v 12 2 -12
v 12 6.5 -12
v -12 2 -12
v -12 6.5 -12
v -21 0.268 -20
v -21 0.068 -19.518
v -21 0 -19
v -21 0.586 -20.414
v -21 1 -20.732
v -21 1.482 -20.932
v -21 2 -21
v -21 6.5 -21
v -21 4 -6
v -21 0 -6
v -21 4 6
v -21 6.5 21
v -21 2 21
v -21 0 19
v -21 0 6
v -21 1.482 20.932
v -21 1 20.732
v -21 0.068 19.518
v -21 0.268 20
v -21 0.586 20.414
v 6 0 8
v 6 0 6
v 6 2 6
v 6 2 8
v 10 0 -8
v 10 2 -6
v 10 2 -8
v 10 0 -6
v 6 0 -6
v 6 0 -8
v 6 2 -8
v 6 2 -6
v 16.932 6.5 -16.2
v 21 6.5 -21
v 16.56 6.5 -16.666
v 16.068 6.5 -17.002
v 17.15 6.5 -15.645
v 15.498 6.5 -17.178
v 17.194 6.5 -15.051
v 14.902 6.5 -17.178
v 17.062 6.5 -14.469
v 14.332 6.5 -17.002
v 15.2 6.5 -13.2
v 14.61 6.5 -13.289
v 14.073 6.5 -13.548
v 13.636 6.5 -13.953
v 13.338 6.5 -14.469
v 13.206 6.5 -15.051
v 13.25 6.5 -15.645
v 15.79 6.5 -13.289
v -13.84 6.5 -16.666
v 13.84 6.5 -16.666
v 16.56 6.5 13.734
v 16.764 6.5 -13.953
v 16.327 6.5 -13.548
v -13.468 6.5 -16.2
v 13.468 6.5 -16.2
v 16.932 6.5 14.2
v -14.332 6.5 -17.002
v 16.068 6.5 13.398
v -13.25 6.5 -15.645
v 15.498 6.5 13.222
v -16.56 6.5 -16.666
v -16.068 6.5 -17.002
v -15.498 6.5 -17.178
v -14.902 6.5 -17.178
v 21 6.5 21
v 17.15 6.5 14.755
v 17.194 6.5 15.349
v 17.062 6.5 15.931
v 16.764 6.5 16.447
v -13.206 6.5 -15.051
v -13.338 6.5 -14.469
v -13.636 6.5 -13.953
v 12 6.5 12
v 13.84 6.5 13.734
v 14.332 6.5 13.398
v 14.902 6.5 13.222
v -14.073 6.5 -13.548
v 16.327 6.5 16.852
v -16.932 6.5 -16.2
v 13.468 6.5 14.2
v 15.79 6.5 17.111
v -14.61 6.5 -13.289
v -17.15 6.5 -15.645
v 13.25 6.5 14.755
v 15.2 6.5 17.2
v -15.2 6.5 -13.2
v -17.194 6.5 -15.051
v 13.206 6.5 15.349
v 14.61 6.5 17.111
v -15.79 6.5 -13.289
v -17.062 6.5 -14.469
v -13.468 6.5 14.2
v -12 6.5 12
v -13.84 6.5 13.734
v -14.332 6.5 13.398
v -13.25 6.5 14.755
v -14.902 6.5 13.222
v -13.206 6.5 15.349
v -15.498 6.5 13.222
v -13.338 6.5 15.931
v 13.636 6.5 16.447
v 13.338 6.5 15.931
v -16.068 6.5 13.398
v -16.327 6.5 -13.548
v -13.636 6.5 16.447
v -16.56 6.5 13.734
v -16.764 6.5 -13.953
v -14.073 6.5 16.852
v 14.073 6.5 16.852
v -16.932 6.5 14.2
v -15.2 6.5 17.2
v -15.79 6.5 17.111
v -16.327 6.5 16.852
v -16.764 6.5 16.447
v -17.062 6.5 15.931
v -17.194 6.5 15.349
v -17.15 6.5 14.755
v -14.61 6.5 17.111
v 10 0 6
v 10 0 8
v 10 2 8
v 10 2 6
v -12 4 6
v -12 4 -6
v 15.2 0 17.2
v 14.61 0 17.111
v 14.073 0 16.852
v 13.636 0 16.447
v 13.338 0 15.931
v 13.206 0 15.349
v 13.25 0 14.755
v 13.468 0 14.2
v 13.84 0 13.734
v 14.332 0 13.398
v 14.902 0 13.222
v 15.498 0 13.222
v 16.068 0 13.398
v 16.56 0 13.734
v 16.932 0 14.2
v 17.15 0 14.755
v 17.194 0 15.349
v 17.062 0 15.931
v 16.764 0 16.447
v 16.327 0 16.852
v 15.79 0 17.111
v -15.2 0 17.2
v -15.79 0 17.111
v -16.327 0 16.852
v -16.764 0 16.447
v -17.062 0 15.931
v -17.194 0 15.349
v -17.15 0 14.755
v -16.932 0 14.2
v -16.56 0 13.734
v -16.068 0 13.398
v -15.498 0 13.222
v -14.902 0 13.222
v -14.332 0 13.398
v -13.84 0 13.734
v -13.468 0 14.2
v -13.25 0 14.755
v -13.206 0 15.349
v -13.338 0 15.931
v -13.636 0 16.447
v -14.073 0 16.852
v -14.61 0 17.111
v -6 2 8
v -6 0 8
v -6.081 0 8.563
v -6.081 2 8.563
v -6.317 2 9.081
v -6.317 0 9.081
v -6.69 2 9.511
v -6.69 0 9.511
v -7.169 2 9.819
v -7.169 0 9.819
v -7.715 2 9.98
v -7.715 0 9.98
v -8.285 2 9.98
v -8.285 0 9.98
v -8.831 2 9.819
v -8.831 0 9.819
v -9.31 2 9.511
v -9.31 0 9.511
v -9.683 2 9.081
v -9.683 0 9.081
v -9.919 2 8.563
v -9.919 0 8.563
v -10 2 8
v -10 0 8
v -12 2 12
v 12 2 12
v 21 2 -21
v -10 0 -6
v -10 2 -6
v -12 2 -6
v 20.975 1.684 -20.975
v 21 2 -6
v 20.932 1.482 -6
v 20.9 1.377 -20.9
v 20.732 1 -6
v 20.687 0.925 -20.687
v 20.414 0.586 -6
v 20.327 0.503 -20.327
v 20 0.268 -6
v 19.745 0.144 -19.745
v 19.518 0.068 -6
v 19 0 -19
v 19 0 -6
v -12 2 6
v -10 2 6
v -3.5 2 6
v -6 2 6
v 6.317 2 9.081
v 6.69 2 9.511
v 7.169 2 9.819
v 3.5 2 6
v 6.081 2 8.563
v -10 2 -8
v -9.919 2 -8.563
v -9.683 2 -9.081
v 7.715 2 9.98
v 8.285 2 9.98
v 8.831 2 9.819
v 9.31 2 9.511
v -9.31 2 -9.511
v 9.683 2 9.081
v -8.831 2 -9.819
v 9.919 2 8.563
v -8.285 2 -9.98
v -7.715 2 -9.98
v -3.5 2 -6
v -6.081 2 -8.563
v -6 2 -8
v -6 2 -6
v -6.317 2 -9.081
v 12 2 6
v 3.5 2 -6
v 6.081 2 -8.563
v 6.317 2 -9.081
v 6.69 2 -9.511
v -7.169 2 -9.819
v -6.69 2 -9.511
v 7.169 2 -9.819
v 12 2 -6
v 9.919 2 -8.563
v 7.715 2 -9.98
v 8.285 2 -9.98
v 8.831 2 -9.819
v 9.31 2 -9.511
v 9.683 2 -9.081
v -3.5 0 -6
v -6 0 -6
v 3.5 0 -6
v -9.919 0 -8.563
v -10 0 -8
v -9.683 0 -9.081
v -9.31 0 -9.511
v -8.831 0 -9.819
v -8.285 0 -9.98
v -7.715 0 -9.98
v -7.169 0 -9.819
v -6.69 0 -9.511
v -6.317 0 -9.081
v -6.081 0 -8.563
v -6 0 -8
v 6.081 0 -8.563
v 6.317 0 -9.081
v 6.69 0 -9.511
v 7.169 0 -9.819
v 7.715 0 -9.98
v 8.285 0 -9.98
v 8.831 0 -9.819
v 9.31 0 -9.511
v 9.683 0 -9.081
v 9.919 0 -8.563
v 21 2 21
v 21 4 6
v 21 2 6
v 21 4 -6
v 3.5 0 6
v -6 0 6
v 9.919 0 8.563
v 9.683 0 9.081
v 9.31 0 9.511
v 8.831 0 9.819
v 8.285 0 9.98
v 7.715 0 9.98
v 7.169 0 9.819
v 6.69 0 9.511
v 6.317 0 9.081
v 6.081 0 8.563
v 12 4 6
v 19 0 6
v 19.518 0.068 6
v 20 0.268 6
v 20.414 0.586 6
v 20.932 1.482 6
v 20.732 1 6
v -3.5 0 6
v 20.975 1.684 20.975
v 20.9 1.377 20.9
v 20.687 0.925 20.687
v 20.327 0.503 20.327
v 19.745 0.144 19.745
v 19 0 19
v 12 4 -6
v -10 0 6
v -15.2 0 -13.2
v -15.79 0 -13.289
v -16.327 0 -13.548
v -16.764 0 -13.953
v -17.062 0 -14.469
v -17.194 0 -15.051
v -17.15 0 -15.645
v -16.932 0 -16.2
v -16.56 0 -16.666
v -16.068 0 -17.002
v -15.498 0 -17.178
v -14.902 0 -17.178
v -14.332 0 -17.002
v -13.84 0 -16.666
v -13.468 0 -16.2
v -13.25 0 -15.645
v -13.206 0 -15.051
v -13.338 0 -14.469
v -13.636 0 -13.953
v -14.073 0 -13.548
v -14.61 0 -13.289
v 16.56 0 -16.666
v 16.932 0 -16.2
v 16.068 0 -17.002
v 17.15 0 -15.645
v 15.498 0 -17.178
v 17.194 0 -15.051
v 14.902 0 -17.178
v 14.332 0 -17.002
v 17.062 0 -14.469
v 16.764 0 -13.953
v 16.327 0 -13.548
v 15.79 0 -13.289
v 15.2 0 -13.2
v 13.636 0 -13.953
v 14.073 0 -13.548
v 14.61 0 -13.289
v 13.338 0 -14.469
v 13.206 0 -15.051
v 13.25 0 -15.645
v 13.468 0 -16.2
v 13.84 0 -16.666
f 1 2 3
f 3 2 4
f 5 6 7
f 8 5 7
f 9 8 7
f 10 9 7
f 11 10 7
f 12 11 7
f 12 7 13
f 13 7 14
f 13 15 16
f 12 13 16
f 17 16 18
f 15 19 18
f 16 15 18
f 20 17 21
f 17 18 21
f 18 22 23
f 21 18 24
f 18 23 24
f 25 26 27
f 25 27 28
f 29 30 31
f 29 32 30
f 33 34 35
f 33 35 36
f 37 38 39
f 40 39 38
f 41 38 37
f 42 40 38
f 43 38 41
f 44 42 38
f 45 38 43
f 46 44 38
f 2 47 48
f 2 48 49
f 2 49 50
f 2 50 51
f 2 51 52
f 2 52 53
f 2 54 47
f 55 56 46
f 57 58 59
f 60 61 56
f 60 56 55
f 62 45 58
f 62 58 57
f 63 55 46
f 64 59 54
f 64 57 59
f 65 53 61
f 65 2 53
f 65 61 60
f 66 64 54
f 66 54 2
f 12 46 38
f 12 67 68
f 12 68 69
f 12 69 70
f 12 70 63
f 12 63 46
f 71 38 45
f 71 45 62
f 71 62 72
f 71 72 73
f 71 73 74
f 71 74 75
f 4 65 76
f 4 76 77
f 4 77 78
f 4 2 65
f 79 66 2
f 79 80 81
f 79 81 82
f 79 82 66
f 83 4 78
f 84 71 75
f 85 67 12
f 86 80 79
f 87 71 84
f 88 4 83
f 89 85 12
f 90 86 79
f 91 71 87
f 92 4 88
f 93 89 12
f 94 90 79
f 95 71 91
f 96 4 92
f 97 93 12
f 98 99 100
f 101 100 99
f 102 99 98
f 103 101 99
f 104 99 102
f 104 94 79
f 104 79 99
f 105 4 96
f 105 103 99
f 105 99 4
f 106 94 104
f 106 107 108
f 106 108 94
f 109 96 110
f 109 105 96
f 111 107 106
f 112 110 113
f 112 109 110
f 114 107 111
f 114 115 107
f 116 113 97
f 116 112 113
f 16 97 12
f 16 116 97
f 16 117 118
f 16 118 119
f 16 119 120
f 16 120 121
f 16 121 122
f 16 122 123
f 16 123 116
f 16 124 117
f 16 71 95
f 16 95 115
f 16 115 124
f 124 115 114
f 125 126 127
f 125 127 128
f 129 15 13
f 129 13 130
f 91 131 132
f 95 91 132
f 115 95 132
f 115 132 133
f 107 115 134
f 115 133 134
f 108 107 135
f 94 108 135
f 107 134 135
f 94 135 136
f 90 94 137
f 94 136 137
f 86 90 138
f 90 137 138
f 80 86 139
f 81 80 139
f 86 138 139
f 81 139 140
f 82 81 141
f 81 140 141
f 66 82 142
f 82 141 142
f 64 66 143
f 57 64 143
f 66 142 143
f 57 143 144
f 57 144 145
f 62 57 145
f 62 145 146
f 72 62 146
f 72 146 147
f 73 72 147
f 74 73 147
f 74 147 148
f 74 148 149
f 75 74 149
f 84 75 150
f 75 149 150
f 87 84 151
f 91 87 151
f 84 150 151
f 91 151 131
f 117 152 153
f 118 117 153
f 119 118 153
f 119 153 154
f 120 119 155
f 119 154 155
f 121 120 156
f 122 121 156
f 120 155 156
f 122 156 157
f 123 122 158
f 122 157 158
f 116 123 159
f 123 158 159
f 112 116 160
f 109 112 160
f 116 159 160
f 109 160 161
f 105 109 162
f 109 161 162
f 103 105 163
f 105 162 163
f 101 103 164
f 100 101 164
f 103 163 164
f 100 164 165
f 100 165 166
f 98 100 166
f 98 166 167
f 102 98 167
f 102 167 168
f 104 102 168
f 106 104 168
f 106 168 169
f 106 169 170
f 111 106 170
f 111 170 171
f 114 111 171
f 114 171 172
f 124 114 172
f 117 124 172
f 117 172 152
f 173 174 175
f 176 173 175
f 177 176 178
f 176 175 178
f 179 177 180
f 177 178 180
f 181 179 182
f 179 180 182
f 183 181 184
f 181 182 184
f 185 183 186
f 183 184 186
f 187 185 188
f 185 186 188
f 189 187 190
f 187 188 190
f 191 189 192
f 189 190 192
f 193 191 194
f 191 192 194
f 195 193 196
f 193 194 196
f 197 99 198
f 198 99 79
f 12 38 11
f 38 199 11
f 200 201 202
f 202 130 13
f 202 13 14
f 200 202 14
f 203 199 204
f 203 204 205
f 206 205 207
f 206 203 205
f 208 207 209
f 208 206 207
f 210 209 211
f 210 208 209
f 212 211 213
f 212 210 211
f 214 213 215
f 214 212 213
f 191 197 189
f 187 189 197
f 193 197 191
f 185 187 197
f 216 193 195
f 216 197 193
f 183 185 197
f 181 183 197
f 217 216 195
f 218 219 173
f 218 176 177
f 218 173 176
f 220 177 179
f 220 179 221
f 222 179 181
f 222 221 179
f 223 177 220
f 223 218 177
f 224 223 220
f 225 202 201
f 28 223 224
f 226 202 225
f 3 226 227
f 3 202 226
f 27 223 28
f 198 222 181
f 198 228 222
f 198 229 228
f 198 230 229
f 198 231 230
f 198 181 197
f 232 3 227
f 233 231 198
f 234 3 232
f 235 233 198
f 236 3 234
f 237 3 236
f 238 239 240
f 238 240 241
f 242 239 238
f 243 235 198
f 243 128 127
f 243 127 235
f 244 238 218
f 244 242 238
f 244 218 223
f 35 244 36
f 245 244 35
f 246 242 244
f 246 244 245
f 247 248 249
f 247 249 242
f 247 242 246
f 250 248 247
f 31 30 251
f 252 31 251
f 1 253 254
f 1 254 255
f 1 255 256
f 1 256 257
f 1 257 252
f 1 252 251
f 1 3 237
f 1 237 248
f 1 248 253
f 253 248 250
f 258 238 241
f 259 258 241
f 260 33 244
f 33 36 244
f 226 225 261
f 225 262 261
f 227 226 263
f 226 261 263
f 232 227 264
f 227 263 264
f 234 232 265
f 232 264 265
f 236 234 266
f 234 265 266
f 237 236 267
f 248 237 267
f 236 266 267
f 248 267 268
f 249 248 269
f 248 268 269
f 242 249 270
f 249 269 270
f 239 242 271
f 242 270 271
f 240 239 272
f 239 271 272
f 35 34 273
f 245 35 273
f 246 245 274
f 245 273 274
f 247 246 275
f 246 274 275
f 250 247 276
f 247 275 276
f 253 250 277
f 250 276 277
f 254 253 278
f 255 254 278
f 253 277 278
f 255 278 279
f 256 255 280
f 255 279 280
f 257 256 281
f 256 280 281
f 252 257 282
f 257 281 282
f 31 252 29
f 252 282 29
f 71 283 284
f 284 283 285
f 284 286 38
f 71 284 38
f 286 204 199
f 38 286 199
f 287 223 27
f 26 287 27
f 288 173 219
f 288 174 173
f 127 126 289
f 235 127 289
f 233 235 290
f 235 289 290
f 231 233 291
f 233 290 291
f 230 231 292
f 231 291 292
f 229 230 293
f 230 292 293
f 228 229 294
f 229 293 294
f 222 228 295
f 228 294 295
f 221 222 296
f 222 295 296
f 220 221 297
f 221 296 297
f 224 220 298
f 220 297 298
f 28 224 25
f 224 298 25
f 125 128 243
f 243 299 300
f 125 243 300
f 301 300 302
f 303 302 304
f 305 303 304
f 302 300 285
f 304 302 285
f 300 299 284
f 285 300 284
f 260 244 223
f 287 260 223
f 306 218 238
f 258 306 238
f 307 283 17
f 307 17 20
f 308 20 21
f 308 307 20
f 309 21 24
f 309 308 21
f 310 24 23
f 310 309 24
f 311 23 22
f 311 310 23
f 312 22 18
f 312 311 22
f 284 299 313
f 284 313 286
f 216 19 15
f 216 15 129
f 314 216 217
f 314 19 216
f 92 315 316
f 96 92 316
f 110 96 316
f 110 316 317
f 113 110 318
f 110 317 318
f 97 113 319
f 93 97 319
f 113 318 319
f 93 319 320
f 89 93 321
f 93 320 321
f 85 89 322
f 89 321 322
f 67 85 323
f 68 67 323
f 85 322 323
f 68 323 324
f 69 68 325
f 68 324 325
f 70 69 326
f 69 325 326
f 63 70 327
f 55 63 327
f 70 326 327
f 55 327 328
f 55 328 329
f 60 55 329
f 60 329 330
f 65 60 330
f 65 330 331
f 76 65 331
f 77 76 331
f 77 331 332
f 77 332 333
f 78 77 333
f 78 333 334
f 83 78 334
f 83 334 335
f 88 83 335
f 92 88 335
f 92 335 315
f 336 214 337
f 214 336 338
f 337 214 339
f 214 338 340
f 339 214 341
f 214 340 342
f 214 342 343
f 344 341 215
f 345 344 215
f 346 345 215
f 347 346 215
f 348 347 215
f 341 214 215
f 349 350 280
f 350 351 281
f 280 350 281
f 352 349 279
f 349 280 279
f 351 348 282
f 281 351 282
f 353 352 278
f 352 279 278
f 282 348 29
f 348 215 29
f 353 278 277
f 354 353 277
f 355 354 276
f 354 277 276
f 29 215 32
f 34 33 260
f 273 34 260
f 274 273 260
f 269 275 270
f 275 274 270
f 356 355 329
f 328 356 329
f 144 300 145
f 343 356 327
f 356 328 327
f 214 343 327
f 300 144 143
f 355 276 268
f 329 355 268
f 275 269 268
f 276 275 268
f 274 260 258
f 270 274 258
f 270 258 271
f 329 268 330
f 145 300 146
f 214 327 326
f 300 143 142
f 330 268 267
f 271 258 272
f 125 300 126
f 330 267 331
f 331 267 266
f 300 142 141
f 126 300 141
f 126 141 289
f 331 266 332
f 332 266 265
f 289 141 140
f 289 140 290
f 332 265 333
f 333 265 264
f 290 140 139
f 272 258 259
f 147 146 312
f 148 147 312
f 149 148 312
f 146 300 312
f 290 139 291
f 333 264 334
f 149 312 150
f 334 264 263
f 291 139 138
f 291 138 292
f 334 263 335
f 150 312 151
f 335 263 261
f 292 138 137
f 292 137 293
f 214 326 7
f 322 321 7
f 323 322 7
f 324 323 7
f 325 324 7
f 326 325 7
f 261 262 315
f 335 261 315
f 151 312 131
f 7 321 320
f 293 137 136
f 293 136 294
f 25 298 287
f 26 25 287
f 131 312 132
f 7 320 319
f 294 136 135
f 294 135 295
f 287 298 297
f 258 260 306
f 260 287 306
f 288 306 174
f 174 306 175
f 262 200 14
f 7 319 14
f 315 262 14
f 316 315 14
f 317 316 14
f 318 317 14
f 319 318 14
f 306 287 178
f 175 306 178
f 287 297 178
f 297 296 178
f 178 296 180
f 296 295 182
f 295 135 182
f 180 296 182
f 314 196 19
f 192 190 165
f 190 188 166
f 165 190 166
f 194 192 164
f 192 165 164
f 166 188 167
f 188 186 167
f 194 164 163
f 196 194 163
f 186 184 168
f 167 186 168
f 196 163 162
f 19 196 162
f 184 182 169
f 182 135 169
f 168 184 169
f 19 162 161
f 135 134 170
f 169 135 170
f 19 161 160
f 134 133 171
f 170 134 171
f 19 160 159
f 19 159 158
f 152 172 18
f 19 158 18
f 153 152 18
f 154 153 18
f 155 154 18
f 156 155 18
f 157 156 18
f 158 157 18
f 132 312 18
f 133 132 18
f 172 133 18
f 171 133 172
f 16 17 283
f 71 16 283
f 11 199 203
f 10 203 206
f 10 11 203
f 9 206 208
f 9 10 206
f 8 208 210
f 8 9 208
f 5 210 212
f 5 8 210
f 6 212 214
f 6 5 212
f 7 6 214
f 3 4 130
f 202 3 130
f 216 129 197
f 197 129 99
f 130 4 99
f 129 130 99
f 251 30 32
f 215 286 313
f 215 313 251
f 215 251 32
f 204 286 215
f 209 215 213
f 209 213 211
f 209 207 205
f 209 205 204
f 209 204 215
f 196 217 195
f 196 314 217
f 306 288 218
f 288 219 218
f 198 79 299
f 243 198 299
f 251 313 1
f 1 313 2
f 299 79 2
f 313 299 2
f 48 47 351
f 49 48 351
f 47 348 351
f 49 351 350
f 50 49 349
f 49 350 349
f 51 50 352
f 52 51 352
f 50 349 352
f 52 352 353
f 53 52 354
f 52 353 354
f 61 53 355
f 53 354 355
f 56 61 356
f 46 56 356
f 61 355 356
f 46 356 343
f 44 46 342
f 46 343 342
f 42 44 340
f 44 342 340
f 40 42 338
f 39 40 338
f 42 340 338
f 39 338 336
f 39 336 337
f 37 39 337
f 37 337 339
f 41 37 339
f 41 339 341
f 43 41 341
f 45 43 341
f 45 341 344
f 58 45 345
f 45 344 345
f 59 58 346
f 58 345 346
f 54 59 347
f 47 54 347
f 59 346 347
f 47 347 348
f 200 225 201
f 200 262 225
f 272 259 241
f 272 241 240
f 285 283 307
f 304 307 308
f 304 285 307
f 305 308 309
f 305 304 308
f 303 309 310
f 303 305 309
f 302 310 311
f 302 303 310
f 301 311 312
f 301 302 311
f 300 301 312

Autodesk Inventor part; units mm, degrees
sketch "Sketch1" plane through (0, 0, 0) normal (0, 1, 0) x (-1, 0, 0)
  line L0 (21, 21) -> (-21, 21)
  line L1 (-21, 21) -> (-21, -21)
  line L2 (-21, -21) -> (21, -21)
  line L3 (21, -21) -> (21, 21)
  line L4 (21, 21) -> (-21, -21) construction
  line L5 (-21, 21) -> (21, -21) construction
  point P0 (0, 0)
  dimension "d0" = 42
  dimension "d1" = 42
extrude "Extrusion1" add sketch "Sketch1" along normal blind 6.5
sketch "Sketch2" plane through (0, 6.5, 0) normal (0, 1, 0) x (1, 0, 0)
  line L0 (-12, -12) -> (12, -12)
  line L1 (12, -12) -> (12, 12)
  line L2 (12, 12) -> (-12, 12)
  line L3 (-12, 12) -> (-12, -12)
  line L4 (-12, -12) -> (12, 12) construction
  line L5 (12, -12) -> (-12, 12) construction
  point P0 (0, 0)
  dimension "d4" = 24
  dimension "d5" = 24
extrude "Extrusion2" cut sketch "Sketch2" against normal blind 4.5
sketch "Sketch3" plane through (0, 2, 0) normal (0, 1, 0) x (1, 0, 0)
  line L0 (-10.5, -6) -> (-3.5, -6)
  line L1 (-3.5, -6) -> (-3.5, 6)
  line L2 (-3.5, 6) -> (-10.5, 6)
  line L3 (-10.5, 6) -> (-10.5, -6)
  line L4 (-10.5, -6) -> (-3.5, 6) construction
  line L5 (-3.5, -6) -> (-10.5, 6) construction
  line L6 (-12, -12) -> (-12, 12) projected
  line L7 (3.5, -6) -> (10.5, -6)
  line L8 (10.5, -6) -> (10.5, 6)
  line L9 (10.5, 6) -> (3.5, 6)
  line L10 (3.5, 6) -> (3.5, -6)
  line L11 (3.5, -6) -> (10.5, 6) construction
  line L12 (10.5, -6) -> (3.5, 6) construction
  line L13 (12, 12) -> (12, -12) projected
  point P0 (0, 0)
  point P1 (-7, 0)
  point P2 (-7, 0)
  point P3 (7, 0)
  point P4 (7, 0)
  dimension "d8" = 7
  dimension "d9" = 12
  dimension "d10" = 1.5
  dimension "d11" = 7
  dimension "d12" = 1.5
  dimension "d13" = 12
extrude "Extrusion3" cut sketch "Sketch3" against normal blind 3.5
sketch "Sketch4" plane through (0, 2, 0) normal (0, 1, 0) x (1, 0, 0)
  line L0 (-12, -12) -> (-12, 12) projected
  line L1 (12, -12) -> (-12, -12) projected
  point P0 (0, 0)
  point P1 (-8, -8)
  point P2 (-8, 8)
  point P3 (8, 8)
  point P4 (8, -8)
  dimension "d16" = 16
  dimension "d17" = 16
  dimension "d18" = 4
  dimension "d19" = 4
hole "Hole1" at (-8, 2, 8) at (-8, 2, -8) at (8, 2, -8) at (8, 2, 8) direction (0, -1, 0) diameter 4 end through all
sketch "Sketch5" plane through (0, 6.5, 0) normal (0, 1, 0) x (1, 0, 0)
  line L0 (-21, -21) -> (21, -21) projected
  line L1 (-21, 21) -> (-21, -21) projected
  point P0 (0, 0)
  point P1 (-15.2, -15.2)
  point P2 (-15.2, 15.2)
  point P3 (15.2, 15.2)
  point P4 (15.2, -15.2)
  dimension "d27" = 30.4
  dimension "d28" = 30.4
  dimension "d29" = 5.8
  dimension "d30" = 5.8
hole "Hole2" at (-15.2, 6.5, 15.2) at (-15.2, 6.5, -15.2) at (15.2, 6.5, -15.2) at (15.2, 6.5, 15.2) direction (0, -1, 0) diameter 4 end through all
ref_plane "Work Plane5" through (-25, 0, -21) normal (-1, 0, 0) x (0, 0, 1)
sketch "Sketch9" plane through (-25, 0, -21) normal (-1, 0, 0) x (0, 0, 1)
  point P0 (21, 0)
ref_plane "Work Plane4" through (25, 0, 21) normal (1, 0, 0) x (0, 0, -1)
sketch "Sketch10" plane through (25, 0, 21) normal (1, 0, 0) x (0, 0, -1)
  line L0 (27, 2) -> (31, 2) projected
  line L1 (27, 2) -> (15, 2) projected
  line L2 (11, 2) -> (15, 2) projected
  line L3 (15, 2) -> (27, 2) projected
  line L4 (27, 2) -> (31, 2) projected
  line L5 (27, 2) -> (15, 2) projected
  line L6 (11, 2) -> (15, 2) projected
  line L7 (15, 2) -> (27, 2) projected
  line L8 (33, 2) -> (9, 2) projected
  line L9 (9, 2) -> (33, 2) projected
  line L10 (27, 2) -> (15, 2) projected
  line L11 (27, 2) -> (27, 0) projected
  line L12 (15, 2) -> (27, 2) projected
  line L13 (15, 2) -> (15, 0) projected
  line L14 (27, 0) -> (15, 0) projected
  point P0 (21, 0)
extrude "Extrusion7" cut sketch "Sketch10" against normal blind 15
ref_plane "Work Plane6" through (-25, 0, -21) normal (-1, 0, 0) x (0, 0, 1)
sketch "Sketch11" plane through (-25, 0, -21) normal (-1, 0, 0) x (0, 0, 1)
  line L0 (27, 2) -> (27, 0) projected
  line L1 (15, 2) -> (27, 2) projected
  line L2 (15, 2) -> (15, 0) projected
  line L3 (27, 0) -> (15, 0) projected
  point P0 (21, 0)
extrude "Extrusion8" cut sketch "Sketch11" against normal blind 15
ref_plane "Work Plane7" through (-25, 0, 6) normal (-1, 0, 0) x (0, 0, 1)
ref_plane "Work Plane8" through (-25, 0, 6) normal (-1, 0, 0) x (0, 0, 1)
ref_plane "Work Plane9" through (-25, 2, -6) normal (0, -1, 0) x (1, 0, 0)
sketch "Sketch16" plane through (-25, 2, -6) normal (0, -1, 0) x (1, 0, 0)
  line L0 (13, 12) -> (13, 0) projected
  line L1 (4, 12) -> (13, 12) projected
  line L2 (4, 0) -> (13, 0) projected
  line L3 (37, 0) -> (37, 12) projected
  line L4 (50, 0) -> (37, 0) projected
  line L5 (50, 12) -> (50, 0) projected
  line L6 (50, 12) -> (37, 12) projected
  line L7 (4, 0) -> (4, 12) projected
  point P0 (25, 6)
extrude "Extrusion11" cut sketch "Sketch16" against normal blind 2
ref_plane "Work Plane10" through (-21, 6.5, 21) normal (1, 0, 0) x (0, 0, -1)
ref_plane "Work Plane11" through (-25, 0, 6) normal (-1, 0, 0) x (0, 0, 1)
fillet "Fillet4" radius 2 4 edges at (21, 0, -13.5) (21, 0, 13.5) (0, 0, -21) (0, 0, 21)
ref_plane "Work Plane12" through (-21.8, 6.5, 21) normal (1, 0, 0) x (0, 0, -1)
sketch "Sketch21" plane through (0, 0, 0) normal (0, -1, 0) x (1, 0, 0)
  circle A0 centre (8, 8) radius 2 projected
  circle A1 centre (8, -8) radius 2 projected
  circle A2 centre (-8, -8) radius 2 projected
  circle A3 centre (-8, 8) radius 2 projected
  circle A4 centre (-8, 8) radius 2 projected
  line L0 (-10, 8) -> (-6, 8)
  line L1 (-6, 8) -> (-6, -8)
  line L2 (-6, -8) -> (-10, -8)
  line L3 (-10, -8) -> (-10, 8)
  line L4 (6, 8) -> (10, 8)
  line L5 (10, 8) -> (10, -8)
  line L6 (10, -8) -> (6, -8)
  line L7 (6, -8) -> (6, 8)
  point P0 (0, 0)
  point P1 (8, 6)
  point P2 (8, -6)
  point P3 (-8, -6)
  point P4 (-8, 6)
  point P5 (10, 8)
  point P6 (-6, 8)
extrude "Extrusion16" cut sketch "Sketch21" against normal blind 3 contours L5 A1 L7 A0 | A2 L3 A3 L1
properties part number "encoder_cover"
